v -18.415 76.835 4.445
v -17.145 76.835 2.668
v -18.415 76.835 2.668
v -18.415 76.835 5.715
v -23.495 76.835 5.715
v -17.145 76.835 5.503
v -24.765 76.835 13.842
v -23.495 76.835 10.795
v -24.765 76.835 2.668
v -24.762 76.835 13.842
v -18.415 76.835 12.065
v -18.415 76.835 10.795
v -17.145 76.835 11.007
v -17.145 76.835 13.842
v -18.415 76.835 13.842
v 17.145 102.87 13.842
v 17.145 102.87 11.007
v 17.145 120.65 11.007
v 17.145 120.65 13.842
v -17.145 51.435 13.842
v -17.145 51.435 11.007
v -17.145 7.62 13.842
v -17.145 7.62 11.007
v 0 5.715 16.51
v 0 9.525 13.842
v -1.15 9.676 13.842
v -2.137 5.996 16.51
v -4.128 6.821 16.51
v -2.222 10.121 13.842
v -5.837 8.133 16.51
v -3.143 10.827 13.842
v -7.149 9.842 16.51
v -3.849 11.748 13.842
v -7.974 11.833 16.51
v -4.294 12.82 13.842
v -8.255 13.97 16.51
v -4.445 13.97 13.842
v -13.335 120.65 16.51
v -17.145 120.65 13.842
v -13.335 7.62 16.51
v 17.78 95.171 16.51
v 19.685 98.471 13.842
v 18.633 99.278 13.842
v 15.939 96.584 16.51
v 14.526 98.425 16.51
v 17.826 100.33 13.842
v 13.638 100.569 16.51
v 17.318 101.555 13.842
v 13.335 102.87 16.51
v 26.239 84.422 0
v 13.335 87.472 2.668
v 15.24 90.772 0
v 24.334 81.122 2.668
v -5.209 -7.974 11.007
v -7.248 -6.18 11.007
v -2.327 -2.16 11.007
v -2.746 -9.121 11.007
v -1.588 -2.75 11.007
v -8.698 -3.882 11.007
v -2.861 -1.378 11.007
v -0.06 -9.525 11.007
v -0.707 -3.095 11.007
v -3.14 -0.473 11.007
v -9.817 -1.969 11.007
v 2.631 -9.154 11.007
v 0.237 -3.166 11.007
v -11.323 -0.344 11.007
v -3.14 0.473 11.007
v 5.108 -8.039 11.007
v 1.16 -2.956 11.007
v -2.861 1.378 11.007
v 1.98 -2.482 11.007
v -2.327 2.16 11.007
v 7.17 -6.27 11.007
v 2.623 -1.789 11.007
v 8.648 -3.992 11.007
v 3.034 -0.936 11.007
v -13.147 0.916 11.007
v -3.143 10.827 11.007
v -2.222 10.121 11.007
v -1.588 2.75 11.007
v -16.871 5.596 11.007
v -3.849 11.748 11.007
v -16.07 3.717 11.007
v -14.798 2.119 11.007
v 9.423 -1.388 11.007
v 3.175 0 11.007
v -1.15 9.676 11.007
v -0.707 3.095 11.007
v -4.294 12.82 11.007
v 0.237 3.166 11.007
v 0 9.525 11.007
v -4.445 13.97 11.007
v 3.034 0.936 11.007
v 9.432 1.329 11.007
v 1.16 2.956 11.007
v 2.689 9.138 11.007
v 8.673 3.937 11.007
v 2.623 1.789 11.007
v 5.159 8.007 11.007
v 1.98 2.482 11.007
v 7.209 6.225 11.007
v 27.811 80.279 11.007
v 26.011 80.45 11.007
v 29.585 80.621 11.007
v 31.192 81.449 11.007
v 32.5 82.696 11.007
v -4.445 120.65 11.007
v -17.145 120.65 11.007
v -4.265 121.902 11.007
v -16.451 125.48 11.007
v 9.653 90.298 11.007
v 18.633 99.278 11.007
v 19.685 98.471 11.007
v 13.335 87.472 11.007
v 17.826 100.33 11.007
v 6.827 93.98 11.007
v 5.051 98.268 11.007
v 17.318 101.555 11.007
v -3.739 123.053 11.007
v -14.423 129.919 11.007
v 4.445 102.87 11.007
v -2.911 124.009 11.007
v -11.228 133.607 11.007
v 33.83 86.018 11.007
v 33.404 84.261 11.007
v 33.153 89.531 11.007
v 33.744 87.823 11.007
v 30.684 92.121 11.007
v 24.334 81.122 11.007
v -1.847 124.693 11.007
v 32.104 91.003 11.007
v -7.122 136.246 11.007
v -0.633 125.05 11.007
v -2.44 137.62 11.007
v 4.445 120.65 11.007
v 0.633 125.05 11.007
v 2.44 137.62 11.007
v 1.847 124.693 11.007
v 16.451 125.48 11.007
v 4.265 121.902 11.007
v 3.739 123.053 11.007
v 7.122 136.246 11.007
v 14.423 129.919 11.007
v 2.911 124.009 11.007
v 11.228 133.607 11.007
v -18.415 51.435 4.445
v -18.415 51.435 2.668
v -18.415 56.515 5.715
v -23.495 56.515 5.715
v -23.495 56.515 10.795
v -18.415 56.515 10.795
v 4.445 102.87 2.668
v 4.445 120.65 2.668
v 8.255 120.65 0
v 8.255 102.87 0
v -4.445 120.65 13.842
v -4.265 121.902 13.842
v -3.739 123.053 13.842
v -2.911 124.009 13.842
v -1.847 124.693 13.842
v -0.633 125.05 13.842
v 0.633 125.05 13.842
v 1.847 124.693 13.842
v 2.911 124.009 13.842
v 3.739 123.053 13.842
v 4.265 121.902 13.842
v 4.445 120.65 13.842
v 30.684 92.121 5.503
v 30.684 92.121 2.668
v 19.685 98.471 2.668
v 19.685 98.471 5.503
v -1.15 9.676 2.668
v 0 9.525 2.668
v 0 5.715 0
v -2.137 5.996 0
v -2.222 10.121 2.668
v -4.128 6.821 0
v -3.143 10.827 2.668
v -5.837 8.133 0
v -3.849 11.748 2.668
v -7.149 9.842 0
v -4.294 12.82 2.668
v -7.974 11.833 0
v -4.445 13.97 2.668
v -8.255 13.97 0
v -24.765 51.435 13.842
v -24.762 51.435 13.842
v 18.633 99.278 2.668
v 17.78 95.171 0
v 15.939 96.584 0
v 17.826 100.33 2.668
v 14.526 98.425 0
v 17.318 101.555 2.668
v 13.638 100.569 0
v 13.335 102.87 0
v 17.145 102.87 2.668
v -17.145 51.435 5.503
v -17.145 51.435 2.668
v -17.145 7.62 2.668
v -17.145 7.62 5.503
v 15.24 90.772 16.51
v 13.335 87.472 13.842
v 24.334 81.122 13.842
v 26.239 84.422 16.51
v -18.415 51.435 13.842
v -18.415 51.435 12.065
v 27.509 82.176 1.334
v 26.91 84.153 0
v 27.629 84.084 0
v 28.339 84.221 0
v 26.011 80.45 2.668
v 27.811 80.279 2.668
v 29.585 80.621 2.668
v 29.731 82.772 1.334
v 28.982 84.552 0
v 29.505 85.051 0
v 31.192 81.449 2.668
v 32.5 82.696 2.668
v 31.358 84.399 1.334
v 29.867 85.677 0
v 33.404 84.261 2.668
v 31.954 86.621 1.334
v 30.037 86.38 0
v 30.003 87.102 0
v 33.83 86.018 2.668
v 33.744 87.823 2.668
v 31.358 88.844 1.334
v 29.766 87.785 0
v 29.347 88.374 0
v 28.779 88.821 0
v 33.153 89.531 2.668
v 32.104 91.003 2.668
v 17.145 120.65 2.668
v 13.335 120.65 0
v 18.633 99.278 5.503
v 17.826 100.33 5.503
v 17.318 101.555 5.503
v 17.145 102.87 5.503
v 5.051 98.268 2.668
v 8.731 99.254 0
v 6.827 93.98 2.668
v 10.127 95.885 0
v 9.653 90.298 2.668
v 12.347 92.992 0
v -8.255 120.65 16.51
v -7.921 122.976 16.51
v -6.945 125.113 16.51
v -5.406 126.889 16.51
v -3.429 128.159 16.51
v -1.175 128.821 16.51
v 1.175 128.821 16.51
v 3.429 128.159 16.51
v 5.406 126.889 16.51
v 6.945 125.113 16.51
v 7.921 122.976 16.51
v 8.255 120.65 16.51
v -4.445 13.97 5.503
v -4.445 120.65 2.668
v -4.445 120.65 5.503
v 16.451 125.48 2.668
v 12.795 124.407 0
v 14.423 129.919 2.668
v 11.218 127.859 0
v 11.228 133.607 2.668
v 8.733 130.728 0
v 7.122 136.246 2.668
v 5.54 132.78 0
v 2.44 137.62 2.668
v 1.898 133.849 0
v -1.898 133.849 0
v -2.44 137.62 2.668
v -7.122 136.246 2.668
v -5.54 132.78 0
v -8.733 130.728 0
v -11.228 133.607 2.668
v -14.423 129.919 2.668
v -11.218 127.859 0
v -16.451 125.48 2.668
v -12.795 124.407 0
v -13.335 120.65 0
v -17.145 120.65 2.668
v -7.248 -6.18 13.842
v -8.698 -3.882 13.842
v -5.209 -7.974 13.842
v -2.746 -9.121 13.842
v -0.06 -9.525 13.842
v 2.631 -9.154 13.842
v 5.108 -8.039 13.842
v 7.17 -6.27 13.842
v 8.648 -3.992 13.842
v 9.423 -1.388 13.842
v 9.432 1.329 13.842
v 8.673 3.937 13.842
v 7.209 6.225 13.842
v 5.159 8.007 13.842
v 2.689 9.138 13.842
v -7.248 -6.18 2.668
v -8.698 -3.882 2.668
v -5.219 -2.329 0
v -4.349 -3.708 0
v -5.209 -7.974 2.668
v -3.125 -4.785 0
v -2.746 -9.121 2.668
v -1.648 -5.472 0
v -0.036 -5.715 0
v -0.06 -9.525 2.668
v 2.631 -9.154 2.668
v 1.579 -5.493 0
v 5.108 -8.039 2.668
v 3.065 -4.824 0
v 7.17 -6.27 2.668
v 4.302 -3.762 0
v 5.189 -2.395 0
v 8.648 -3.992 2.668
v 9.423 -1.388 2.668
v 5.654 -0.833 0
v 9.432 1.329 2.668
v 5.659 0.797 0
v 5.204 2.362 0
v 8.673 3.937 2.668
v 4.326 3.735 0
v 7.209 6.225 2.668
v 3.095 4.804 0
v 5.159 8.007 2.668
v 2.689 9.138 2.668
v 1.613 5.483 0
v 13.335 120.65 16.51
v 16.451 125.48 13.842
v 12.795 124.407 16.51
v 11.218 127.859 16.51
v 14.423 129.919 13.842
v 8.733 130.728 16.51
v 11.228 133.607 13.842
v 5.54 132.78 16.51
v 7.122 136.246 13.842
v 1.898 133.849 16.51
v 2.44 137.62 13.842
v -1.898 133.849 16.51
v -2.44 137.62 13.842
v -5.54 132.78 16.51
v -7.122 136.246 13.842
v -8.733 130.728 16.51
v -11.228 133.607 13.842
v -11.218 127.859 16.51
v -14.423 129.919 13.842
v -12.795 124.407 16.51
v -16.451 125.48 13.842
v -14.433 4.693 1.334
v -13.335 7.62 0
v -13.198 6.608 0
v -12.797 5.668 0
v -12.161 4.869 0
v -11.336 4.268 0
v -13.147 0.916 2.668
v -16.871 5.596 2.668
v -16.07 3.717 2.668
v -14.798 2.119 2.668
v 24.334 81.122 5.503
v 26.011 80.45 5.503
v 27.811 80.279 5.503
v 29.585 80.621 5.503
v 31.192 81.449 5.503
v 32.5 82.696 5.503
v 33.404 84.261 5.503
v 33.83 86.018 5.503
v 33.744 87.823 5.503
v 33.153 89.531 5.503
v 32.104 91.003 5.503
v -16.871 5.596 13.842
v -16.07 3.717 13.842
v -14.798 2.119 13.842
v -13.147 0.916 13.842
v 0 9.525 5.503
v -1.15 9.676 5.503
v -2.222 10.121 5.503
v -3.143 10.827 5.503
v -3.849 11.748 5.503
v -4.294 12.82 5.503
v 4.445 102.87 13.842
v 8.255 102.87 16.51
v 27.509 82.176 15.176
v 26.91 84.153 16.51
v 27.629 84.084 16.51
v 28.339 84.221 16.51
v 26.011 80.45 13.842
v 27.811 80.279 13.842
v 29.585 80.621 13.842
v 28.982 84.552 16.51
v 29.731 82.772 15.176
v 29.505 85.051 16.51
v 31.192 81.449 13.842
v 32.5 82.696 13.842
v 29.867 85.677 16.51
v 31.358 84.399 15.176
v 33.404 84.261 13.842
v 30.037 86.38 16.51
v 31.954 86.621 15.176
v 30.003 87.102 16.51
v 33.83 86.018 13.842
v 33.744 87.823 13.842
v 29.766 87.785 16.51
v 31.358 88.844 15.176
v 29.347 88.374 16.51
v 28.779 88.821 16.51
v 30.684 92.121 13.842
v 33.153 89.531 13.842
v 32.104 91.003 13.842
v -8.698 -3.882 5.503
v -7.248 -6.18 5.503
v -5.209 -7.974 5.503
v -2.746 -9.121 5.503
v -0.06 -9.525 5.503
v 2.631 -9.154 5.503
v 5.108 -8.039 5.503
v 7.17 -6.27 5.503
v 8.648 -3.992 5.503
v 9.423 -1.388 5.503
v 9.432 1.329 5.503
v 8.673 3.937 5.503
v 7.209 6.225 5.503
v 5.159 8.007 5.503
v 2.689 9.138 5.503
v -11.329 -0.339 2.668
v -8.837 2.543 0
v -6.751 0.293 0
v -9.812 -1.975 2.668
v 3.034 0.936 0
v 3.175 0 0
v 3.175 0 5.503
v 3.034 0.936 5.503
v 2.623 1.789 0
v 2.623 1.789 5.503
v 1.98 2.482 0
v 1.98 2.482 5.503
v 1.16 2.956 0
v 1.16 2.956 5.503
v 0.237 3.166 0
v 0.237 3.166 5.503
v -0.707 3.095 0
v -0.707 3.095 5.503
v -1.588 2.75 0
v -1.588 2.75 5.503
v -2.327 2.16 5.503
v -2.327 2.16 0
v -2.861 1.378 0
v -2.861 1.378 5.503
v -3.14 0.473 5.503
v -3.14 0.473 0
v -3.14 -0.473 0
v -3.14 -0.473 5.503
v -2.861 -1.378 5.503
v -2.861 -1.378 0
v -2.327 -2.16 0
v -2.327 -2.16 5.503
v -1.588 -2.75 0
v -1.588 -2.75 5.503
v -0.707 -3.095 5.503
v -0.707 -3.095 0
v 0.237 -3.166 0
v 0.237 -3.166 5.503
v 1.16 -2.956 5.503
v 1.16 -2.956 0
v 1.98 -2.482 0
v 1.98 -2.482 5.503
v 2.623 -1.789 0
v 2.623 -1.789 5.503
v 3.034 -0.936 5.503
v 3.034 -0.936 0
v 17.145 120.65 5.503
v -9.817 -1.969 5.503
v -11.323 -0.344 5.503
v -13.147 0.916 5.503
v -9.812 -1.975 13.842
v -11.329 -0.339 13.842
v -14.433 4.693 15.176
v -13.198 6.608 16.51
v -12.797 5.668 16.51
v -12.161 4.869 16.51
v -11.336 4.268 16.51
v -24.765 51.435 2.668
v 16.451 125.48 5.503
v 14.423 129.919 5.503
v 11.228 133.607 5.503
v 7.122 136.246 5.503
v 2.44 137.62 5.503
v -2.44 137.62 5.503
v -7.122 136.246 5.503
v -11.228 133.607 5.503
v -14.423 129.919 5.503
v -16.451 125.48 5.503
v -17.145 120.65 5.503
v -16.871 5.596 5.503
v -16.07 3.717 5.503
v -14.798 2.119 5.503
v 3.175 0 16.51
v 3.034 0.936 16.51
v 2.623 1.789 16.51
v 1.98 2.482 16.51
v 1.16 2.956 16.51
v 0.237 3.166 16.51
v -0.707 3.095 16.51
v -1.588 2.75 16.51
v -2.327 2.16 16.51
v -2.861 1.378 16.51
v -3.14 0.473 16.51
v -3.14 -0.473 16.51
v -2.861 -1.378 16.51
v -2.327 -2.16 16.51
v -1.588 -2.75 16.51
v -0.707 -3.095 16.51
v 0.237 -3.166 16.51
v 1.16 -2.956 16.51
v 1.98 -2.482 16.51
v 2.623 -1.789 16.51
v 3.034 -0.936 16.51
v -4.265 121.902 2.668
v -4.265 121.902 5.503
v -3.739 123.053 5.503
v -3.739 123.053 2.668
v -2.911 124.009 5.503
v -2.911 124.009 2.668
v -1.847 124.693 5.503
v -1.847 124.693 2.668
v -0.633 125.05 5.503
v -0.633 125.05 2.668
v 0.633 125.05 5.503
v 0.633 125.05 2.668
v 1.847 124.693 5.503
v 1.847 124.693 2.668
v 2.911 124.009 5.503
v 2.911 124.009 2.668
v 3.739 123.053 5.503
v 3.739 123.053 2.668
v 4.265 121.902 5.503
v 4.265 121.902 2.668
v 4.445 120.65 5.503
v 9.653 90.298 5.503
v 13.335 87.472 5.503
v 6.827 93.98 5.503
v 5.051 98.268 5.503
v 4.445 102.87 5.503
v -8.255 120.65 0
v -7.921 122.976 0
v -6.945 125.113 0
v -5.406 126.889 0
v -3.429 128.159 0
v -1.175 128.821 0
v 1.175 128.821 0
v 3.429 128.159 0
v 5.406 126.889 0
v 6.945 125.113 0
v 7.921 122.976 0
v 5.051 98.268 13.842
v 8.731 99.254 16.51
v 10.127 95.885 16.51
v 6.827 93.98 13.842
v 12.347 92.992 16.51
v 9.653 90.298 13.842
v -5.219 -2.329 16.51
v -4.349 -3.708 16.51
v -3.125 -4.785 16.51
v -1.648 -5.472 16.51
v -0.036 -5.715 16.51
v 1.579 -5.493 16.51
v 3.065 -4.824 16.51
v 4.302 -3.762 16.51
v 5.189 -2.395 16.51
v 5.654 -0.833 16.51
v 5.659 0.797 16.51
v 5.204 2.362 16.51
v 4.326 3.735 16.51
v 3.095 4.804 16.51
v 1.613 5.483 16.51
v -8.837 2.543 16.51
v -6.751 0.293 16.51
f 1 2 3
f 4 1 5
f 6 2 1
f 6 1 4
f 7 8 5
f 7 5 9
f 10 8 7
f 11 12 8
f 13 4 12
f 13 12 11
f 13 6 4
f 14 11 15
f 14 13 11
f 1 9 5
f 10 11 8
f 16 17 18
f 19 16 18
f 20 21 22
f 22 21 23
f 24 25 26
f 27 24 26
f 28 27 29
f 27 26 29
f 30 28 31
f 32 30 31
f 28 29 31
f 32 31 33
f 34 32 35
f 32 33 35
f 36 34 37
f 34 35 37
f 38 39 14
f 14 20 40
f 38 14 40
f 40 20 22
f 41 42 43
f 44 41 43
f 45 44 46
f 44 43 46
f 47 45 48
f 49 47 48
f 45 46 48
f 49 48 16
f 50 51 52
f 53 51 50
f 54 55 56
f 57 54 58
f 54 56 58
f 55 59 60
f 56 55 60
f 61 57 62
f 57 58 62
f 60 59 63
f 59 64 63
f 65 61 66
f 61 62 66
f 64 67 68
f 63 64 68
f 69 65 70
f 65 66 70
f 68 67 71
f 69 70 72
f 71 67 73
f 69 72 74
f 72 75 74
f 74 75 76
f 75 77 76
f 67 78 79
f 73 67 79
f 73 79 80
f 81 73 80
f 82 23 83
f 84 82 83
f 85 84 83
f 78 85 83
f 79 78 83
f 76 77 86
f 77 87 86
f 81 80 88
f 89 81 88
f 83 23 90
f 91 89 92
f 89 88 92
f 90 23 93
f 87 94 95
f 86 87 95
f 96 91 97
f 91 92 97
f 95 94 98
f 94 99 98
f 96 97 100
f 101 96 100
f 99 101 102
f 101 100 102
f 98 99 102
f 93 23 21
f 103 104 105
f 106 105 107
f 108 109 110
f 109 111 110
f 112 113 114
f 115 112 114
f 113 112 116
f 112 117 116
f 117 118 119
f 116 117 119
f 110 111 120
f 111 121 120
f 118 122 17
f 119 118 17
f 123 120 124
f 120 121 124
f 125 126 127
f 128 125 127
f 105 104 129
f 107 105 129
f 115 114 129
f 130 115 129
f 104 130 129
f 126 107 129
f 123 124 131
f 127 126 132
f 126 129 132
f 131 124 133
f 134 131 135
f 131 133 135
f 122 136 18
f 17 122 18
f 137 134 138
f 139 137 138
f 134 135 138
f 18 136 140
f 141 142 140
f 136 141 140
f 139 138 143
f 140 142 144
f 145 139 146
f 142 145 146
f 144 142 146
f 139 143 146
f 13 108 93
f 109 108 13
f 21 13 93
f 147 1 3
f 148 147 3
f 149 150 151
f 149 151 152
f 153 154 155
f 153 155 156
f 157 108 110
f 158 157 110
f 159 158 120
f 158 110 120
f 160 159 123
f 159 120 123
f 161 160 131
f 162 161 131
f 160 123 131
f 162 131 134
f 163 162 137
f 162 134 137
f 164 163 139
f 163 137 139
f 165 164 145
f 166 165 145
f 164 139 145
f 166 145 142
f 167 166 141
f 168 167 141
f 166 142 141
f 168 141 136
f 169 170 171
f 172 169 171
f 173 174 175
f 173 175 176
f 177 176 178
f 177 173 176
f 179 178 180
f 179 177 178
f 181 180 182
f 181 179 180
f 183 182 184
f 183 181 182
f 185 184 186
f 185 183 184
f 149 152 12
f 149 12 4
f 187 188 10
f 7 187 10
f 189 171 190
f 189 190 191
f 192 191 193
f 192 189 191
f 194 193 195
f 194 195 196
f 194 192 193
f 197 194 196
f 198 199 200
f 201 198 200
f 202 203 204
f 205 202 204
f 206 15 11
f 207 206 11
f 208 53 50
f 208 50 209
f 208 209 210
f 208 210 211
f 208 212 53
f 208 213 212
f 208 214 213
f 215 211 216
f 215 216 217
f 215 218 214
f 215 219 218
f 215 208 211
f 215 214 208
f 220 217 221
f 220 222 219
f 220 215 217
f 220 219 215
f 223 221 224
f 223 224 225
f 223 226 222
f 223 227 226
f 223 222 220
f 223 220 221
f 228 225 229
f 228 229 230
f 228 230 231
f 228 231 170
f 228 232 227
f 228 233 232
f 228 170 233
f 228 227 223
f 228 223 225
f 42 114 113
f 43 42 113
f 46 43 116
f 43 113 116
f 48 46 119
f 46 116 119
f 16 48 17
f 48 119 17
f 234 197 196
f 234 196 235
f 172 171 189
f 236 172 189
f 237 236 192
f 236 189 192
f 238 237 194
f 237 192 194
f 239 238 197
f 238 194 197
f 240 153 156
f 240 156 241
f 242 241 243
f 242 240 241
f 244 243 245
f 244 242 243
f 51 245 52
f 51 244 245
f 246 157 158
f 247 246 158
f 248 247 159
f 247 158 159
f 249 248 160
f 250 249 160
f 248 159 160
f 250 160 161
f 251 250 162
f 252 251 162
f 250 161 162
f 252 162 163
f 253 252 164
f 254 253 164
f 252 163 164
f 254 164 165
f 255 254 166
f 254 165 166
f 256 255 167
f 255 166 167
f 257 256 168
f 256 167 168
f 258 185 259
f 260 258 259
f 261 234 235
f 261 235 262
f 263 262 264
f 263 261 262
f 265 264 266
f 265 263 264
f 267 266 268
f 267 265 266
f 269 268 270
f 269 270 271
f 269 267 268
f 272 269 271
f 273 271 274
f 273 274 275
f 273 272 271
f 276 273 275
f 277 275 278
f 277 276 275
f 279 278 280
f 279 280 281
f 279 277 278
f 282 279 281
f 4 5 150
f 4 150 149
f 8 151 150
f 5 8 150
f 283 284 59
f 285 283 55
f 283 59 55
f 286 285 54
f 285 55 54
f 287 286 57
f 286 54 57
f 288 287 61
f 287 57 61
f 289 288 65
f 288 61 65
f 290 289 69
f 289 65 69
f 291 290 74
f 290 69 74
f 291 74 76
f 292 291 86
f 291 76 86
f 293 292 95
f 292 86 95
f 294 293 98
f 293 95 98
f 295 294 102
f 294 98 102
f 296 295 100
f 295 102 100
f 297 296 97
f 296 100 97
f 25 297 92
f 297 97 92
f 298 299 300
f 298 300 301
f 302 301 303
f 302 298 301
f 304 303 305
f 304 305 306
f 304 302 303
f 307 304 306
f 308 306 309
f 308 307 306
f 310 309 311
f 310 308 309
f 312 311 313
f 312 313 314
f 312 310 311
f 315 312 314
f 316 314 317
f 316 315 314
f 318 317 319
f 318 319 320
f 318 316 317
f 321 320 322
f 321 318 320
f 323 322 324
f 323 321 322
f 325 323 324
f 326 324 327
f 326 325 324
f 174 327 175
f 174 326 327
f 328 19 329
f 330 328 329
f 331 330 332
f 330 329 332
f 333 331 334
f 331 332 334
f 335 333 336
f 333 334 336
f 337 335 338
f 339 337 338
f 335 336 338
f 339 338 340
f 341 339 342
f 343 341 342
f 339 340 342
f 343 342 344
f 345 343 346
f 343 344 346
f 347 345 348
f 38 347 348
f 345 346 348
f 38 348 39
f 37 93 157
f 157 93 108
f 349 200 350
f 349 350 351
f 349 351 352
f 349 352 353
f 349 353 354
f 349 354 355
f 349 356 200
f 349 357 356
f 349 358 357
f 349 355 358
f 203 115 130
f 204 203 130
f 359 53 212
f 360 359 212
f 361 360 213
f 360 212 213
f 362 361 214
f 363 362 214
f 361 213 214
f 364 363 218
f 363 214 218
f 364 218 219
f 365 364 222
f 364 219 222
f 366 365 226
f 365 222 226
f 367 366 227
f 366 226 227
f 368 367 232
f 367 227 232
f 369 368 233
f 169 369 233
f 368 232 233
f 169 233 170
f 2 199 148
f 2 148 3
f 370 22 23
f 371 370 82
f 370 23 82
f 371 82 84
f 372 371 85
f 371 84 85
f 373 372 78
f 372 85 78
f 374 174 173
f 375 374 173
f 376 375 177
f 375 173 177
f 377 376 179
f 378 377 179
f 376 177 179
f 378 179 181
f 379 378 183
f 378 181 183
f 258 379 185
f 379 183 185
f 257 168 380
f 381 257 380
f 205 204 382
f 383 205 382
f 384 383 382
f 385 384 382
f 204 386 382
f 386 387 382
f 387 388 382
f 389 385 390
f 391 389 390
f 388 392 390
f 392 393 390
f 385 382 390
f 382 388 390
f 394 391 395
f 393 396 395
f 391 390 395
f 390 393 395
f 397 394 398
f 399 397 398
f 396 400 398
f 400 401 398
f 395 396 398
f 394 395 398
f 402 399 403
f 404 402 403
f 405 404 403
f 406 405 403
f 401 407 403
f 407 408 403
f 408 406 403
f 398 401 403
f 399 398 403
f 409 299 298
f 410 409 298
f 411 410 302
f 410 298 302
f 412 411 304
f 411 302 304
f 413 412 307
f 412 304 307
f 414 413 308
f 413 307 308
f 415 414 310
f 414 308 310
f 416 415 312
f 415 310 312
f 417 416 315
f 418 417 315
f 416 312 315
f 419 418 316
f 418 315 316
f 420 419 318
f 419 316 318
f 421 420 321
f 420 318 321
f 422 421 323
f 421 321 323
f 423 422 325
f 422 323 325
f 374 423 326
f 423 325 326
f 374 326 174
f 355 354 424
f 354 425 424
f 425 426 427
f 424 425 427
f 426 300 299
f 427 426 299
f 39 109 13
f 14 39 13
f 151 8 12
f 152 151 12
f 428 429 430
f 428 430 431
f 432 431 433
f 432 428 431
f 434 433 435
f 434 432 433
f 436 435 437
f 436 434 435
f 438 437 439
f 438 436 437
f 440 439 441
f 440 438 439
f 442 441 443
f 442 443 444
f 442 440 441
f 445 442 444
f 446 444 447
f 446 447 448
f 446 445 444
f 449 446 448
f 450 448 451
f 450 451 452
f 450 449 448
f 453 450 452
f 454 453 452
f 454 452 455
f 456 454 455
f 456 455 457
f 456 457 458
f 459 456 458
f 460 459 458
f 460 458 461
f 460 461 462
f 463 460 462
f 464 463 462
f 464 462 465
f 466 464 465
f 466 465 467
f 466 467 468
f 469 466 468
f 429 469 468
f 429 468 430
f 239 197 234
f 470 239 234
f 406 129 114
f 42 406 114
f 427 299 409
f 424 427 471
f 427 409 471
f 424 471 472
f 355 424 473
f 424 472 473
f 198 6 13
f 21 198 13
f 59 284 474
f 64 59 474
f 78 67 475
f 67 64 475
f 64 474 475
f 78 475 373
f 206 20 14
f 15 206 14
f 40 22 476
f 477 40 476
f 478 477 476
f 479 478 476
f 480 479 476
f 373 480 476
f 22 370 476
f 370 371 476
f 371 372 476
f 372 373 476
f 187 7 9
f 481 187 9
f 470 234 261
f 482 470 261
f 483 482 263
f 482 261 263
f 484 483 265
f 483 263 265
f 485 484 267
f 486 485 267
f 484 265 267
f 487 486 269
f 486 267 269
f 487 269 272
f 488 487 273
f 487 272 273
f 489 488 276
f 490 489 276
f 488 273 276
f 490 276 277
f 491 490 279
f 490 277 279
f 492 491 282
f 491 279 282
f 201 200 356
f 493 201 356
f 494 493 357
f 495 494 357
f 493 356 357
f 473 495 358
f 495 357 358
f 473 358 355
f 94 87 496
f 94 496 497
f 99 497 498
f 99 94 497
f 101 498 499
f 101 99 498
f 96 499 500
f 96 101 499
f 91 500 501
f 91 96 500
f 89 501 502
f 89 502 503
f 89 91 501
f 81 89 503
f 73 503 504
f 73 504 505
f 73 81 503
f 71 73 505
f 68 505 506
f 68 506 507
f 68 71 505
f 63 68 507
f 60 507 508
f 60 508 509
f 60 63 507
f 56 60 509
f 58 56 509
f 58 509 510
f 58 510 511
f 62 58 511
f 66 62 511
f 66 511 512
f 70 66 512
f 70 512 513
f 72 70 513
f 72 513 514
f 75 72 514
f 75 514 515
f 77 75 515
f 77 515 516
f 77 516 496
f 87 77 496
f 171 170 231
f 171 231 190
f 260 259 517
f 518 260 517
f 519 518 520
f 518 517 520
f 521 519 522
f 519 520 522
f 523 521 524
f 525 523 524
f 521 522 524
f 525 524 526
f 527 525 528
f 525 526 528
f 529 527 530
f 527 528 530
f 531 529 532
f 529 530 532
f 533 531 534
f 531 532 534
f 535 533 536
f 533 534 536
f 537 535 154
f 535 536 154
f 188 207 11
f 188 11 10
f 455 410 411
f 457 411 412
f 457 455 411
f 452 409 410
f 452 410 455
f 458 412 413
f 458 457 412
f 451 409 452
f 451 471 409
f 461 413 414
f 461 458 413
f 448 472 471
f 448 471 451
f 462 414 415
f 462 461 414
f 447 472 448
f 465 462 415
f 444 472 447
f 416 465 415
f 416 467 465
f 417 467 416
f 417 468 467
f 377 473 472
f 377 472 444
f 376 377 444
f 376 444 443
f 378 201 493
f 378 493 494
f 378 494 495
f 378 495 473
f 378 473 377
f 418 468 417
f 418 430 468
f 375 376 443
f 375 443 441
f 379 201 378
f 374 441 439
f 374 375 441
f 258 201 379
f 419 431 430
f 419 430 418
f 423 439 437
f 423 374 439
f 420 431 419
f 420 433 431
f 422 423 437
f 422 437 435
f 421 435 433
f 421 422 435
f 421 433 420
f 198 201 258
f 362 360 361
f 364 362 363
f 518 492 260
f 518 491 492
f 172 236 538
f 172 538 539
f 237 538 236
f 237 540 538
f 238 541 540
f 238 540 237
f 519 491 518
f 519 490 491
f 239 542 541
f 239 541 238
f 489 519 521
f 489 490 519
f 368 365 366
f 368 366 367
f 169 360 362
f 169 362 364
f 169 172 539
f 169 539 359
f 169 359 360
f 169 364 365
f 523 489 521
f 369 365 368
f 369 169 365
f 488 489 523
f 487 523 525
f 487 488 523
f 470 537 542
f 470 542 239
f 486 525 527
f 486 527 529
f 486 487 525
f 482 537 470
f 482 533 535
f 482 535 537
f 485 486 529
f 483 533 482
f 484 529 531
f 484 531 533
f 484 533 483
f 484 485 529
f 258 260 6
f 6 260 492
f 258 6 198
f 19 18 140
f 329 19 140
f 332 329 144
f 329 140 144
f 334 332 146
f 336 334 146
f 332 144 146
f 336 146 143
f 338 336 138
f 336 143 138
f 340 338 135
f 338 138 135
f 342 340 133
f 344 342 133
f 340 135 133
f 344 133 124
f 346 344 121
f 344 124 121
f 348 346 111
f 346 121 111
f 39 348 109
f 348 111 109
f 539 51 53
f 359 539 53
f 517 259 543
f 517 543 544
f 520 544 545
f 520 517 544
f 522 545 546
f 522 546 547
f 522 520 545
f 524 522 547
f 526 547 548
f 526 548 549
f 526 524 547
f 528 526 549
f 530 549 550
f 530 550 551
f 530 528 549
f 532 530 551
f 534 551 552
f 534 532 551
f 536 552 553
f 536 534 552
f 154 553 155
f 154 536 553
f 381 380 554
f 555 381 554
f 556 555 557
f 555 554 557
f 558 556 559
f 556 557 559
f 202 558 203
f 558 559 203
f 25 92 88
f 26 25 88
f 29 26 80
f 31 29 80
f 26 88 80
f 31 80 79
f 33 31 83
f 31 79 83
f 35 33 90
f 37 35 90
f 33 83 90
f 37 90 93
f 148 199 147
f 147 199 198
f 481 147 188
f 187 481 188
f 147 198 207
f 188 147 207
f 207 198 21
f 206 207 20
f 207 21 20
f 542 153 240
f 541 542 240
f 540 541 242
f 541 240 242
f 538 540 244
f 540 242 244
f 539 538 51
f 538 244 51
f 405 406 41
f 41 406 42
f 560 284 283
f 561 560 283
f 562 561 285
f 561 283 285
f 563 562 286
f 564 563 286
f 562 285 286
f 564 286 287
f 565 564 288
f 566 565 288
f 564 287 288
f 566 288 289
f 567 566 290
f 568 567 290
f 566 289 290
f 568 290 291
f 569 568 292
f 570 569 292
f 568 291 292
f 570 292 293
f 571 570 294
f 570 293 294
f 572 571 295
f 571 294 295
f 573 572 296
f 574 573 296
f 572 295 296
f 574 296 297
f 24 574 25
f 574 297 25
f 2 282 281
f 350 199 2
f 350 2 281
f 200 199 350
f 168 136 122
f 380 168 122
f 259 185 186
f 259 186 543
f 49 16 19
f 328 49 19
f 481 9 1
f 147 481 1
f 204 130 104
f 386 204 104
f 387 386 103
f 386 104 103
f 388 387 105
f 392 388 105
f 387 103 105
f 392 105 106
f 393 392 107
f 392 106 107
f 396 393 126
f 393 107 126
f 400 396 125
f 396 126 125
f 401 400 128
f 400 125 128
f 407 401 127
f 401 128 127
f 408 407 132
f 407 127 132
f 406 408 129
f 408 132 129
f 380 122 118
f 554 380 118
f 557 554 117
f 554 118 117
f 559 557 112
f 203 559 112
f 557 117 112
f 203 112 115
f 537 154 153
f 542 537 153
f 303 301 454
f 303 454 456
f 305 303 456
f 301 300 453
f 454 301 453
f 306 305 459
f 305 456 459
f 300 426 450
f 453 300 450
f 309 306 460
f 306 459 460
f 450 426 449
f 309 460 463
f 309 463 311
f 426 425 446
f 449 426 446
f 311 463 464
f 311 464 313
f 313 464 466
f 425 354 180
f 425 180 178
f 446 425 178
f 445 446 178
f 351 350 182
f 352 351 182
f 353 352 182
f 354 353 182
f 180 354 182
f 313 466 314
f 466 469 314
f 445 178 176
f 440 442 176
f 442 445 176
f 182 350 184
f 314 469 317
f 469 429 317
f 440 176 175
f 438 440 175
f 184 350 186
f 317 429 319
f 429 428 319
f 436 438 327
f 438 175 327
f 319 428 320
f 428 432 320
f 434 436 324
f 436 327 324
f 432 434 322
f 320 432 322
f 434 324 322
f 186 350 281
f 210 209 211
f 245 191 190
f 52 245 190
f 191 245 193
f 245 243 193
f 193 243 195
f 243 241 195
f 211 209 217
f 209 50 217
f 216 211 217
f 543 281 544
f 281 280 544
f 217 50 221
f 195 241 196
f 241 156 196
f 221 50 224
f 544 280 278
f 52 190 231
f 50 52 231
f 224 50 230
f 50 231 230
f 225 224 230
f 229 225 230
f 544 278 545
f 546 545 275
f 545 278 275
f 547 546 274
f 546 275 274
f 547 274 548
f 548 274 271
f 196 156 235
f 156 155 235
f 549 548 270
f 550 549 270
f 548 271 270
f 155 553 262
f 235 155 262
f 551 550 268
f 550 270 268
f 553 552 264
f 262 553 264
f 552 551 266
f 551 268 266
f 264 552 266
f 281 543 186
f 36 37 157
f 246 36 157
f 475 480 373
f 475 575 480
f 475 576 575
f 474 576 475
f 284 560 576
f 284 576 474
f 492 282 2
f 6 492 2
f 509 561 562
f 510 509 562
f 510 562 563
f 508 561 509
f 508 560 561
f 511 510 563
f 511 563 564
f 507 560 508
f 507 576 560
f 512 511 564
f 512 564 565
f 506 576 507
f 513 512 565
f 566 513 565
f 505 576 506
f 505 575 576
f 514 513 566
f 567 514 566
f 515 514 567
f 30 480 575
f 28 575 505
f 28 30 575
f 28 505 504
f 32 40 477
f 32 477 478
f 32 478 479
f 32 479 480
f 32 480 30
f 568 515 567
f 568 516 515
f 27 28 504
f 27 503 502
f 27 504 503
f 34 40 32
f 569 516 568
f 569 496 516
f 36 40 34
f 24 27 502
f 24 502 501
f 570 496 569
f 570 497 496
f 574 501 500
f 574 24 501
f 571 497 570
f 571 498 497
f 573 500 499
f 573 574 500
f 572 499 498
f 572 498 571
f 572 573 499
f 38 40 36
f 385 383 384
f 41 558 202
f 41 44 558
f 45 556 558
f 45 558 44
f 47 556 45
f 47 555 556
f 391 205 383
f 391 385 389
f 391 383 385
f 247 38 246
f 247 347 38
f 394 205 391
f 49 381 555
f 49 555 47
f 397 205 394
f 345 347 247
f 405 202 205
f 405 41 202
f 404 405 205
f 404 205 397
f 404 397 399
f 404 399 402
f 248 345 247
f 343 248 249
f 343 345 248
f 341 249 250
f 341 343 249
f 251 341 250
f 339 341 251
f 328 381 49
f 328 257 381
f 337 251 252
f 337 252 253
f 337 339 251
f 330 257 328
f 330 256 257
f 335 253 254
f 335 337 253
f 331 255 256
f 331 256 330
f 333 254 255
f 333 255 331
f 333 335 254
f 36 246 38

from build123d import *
from OCP.BRepFilletAPI import BRepFilletAPI_MakeChamfer

# Parameters (mm, degrees)
SKETCH1_R           = 3.175
BOSS_EXTRUDE1_DEPTH = 16.51
FILLET1_R           = 10.16
CHAMFER1_SIZE       = 3.81
CHAMFER1_SIZE2      = 2.667790721
SPLIT1_START        = 5.503333164
SPLIT1_OUTLINE_R    = 3.175
SPLIT1_DEPTH        = 5.503333418
SKETCH4_W           = 11.174418558
SKETCH4_H           = 25.4
BOSS_EXTRUDE2_DEPTH = 12.7
SKETCH5_W           = 5.08
SKETCH5_H           = 11.174418558
CUT_EXTRUDE1_DEPTH  = 95.217988066
SKETCH7_W           = 5.08
SKETCH7_H           = 5.08
CUT_EXTRUDE2_DEPTH  = 20.32


# Read off the part's stored shape, not the designer's step: Split1
with BuildPart() as part:
    # Sketch1 → Boss-Extrude1 (new body)
    with BuildSketch(Plane.XY):
        with BuildLine():
            Line((4.445, 120.65), (4.445, 102.87))
            ThreePointArc((4.445, 102.87), (6.827068321, 93.98), (13.335, 87.472068321))
            Line((13.335, 87.472068321), (24.333522628, 81.122068321))
            ThreePointArc((24.333522628, 81.122068321), (33.007783942, 83.446329635), (30.683522628, 92.120590949))
            Line((30.683522628, 92.120590949), (19.685, 98.470590949))
            ThreePointArc((19.685, 98.470590949), (17.825590949, 100.33), (17.145, 102.87))
            Line((17.145, 102.87), (17.145, 120.65))
            ThreePointArc((17.145, 120.65), (0, 137.795), (-17.145, 120.65))
            Line((-17.145, 120.65), (-17.145, 7.62))
            ThreePointArc((-17.145, 7.62), (-14.913153673, 2.231846327), (-9.525, 0))
            ThreePointArc((-9.525, 0), (6.735192091, -6.735192091), (0, 9.525))
            ThreePointArc((0, 9.525), (-3.143089642, 10.826910358), (-4.445, 13.97))
            Line((-4.445, 13.97), (-4.445, 120.65))
            ThreePointArc((-4.445, 120.65), (0, 125.095), (4.445, 120.65))
        make_face()
        Circle(SKETCH1_R, mode=Mode.SUBTRACT)
    extrude(amount=BOSS_EXTRUDE1_DEPTH)

    # Fillet1
    fillet1_edges = [part.edges().sort_by_distance(p)[0] for p in [
        (-9.525, 0, 8.255),
    ]]
    fillet(fillet1_edges, radius=FILLET1_R)

    # Chamfer1: one chamfer whose edges measure the first distance from different faces: ONE call of the kernel's chamfer builder (chamfer() names one face for all edges)
    chamfer1_edges_1 = [part.edges().sort_by_distance(p)[0] for p in [
        (-3.143089642, 10.826910358, 16.51),
        (-4.445, 67.31, 16.51),
        (0, 125.095, 16.51),
        (4.445, 111.76, 16.51),
        (6.827068321, 93.98, 16.51),
        (18.834261314, 84.297068321, 16.51),
        (33.007783942, 83.446329635, 16.51),
        (25.184261314, 95.295590949, 16.51),
        (17.825590949, 100.33, 16.51),
        (7.990751239, -5.183967557, 16.51),
        (-10.525505779, -1.115347445, 16.51),
        (17.145, 111.76, 16.51),
        (-16.069536152, 3.716995189, 16.51),
        (0, 137.795, 16.51),
        (-17.145, 64.135, 16.51),
    ]]
    chamfer1_side_1 = [part.faces().sort_by_distance(p)[0] for p in [
        (-14.730576104, 4.515518933, 16.51),
    ]]
    chamfer1_edges_2 = [part.edges().sort_by_distance(p)[0] for p in [
        (-17.145, 64.135, 0),
        (0, 137.795, 0),
        (17.145, 111.76, 0),
        (17.825590949, 100.33, 0),
        (25.184261314, 95.295590949, 0),
        (33.007783942, 83.446329635, 0),
        (18.834261314, 84.297068321, 0),
        (6.827068321, 93.98, 0),
        (4.445, 111.76, 0),
        (0, 125.095, 0),
        (-4.445, 67.31, 0),
        (-3.143089642, 10.826910358, 0),
        (-16.069536152, 3.716995189, 0),
        (7.990751239, -5.183967557, 0),
        (-10.525505779, -1.115347445, 0),
    ]]
    chamfer1_side_2 = [part.faces().sort_by_distance(p)[0] for p in [
        (-14.730576104, 4.515518933, 0),
    ]]
    chamfer1 = BRepFilletAPI_MakeChamfer(part.part.solid().wrapped)
    for e in chamfer1_edges_1:
        chamfer1.Add(CHAMFER1_SIZE, CHAMFER1_SIZE2, e.wrapped, chamfer1_side_1[0].wrapped)  # the first distance lies on this face
    for e in chamfer1_edges_2:
        chamfer1.Add(CHAMFER1_SIZE, CHAMFER1_SIZE2, e.wrapped, chamfer1_side_2[0].wrapped)  # the first distance lies on this face
    add(Compound.cast(chamfer1.Shape()), mode=Mode.REPLACE)

    # Split1 outline → Split1 (cut)
    with BuildSketch(Plane.XY.offset(SPLIT1_START)):
        with BuildLine():
            ThreePointArc((-17.145, 7.62), (-16.069536152, 3.716995189), (-13.146720064, 0.915707063))
            ThreePointArc((-13.146720064, 0.915707063), (-10.525505779, -1.115347445), (-8.697909749, -3.882266219))
            ThreePointArc((-8.697909749, -3.882266219), (7.990751239, -5.183967557), (0, 9.525))
            ThreePointArc((0, 9.525), (-3.143089642, 10.826910358), (-4.445, 13.97))
            Line((-4.445, 13.97), (-4.445, 120.65))
            ThreePointArc((-4.445, 120.65), (0, 125.095), (4.445, 120.65))
            Line((4.445, 120.65), (4.445, 102.87))
            ThreePointArc((4.445, 102.87), (6.827068321, 93.98), (13.335, 87.472068321))
            Line((13.335, 87.472068321), (24.333522628, 81.122068321))
            ThreePointArc((24.333522628, 81.122068321), (33.007783942, 83.446329635), (30.683522628, 92.120590949))
            Line((30.683522628, 92.120590949), (19.685, 98.470590949))
            ThreePointArc((19.685, 98.470590949), (17.825590949, 100.33), (17.145, 102.87))
            Line((17.145, 102.87), (17.145, 120.65))
            ThreePointArc((17.145, 120.65), (0, 137.795), (-17.145, 120.65))
            Line((-17.145, 120.65), (-17.145, 7.62))
        make_face()
        Circle(SPLIT1_OUTLINE_R, mode=Mode.SUBTRACT)
    extrude(amount=SPLIT1_DEPTH, mode=Mode.SUBTRACT)

    # Sketch4 → Boss-Extrude2 (add)
    with BuildSketch(Plane.ZY.offset(17.145)):
        with Locations((8.255, 64.135)):
            Rectangle(SKETCH4_W, SKETCH4_H)
    extrude(amount=BOSS_EXTRUDE2_DEPTH)

    # Sketch5 → Cut-Extrude1 (cut, through all)
    with BuildSketch(Plane(origin=(0, 76.835, 0), x_dir=(1, 0, 0), z_dir=(0, 1, 0))):
        Polygon((-24.765, -2.667790721), (-18.414778652, -4.445000002), (-18.414778652, -2.667790721), align=None)
        with Locations((-27.305, -8.255)):
            Rectangle(SKETCH5_W, SKETCH5_H)
        Polygon((-18.415, -12.064999998), (-24.762176004, -13.842209279), (-18.415, -13.842209279), align=None)
    extrude(amount=-CUT_EXTRUDE1_DEPTH, mode=Mode.SUBTRACT)

    # Sketch7 → Cut-Extrude2 (cut)
    with BuildSketch(Plane(origin=(0, 76.835, 0), x_dir=(1, 0, 0), z_dir=(0, 1, 0))):
        with Locations((-20.955000002, -8.255)):
            Rectangle(SKETCH7_W, SKETCH7_H)
    extrude(amount=-CUT_EXTRUDE2_DEPTH, mode=Mode.SUBTRACT)


solid = part.part
